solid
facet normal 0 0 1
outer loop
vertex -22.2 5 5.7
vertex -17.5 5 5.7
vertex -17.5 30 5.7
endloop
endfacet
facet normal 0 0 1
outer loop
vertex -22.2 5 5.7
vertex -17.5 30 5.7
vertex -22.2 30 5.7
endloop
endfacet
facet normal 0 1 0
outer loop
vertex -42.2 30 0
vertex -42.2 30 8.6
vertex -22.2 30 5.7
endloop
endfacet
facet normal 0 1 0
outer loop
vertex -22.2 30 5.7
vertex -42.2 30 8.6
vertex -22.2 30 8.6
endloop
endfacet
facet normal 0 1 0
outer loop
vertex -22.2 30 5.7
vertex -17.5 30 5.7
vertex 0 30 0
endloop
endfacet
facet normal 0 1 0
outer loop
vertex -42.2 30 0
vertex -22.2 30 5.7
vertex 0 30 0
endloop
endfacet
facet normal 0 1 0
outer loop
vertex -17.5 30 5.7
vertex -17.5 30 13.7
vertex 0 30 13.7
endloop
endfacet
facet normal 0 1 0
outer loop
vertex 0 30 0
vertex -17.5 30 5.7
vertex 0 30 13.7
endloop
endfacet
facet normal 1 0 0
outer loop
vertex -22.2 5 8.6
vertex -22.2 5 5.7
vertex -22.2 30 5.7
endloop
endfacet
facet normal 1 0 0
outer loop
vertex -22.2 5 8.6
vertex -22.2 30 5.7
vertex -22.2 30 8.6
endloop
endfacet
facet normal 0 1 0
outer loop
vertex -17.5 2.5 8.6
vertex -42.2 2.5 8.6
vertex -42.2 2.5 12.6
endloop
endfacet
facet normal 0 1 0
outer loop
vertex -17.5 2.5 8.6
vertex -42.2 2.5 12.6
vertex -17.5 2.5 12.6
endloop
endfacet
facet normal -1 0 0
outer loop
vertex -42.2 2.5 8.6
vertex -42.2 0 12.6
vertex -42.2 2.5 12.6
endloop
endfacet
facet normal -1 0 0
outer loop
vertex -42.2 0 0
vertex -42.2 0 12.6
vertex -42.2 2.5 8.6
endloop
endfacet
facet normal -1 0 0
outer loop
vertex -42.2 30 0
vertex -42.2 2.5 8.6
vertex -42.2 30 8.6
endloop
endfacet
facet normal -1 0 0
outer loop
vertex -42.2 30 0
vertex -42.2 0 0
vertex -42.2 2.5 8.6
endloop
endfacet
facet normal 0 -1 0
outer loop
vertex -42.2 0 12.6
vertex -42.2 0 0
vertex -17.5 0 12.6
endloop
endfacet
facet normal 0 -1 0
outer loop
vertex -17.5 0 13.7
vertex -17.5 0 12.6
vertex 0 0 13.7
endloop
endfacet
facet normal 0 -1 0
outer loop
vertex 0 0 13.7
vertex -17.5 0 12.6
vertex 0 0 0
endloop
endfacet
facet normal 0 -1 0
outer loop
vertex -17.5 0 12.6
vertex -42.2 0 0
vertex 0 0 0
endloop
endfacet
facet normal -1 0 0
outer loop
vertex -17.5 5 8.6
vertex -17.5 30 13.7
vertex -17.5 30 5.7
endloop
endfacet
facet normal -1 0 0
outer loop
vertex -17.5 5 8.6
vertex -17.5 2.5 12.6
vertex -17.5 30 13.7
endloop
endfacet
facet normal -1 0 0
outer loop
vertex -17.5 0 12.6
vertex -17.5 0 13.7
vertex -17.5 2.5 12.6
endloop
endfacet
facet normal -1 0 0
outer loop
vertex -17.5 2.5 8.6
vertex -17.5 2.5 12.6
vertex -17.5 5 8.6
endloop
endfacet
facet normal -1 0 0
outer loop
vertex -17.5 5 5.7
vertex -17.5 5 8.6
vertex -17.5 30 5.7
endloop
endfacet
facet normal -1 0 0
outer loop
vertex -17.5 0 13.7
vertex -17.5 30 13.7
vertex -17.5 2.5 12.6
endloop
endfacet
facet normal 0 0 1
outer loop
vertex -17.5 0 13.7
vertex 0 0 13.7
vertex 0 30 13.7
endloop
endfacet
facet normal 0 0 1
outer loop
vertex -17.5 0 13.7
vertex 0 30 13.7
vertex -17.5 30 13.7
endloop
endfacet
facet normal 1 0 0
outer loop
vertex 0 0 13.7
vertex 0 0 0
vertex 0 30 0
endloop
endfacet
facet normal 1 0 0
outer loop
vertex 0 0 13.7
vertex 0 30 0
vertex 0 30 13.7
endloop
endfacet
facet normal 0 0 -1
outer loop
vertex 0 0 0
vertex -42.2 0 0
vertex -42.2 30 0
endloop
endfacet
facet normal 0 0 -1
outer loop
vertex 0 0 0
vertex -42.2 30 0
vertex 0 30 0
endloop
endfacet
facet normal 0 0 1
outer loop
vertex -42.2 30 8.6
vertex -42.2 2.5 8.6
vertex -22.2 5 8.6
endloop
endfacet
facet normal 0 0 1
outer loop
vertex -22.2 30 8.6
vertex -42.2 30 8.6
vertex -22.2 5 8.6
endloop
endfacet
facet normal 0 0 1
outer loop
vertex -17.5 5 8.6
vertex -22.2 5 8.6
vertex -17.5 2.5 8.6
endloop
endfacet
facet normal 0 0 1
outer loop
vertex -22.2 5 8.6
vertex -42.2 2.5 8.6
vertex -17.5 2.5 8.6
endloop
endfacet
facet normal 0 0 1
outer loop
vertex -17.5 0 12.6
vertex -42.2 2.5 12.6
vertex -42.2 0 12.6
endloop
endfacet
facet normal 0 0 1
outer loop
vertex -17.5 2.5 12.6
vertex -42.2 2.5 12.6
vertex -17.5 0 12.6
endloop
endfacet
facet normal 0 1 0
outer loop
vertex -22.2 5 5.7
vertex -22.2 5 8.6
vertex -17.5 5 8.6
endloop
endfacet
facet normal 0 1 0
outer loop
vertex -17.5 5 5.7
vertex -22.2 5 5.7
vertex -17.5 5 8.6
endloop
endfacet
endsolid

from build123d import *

# Parameters (mm, degrees)
F1_DEPTH = 30
F0_W     = 4.7
F0_H     = 2.9
F2_DEPTH = 5
F3_W     = 24.7
F3_H     = 2.5
F4_DEPTH = 4


with BuildPart() as f1:
    # F0 (on Front) → F1 (new body)
    with BuildSketch(Plane.XZ):
        Polygon((-42.2, 0), (0, 0), (0, 13.7), (-17.5, 13.7), (-17.5, 8.6), (-17.5, 5.7), (-22.2, 5.7), (-22.2, 8.6), (-42.2, 8.6), align=None)
    extrude(amount=-F1_DEPTH)

    # F0 (on Front) → F2 (join)
    with BuildSketch(Plane.XZ):
        with Locations((-19.85, 7.15)):
            Rectangle(F0_W, F0_H)
    extrude(amount=-F2_DEPTH)

    # F3 (on face) → F4 (join)
    with BuildSketch(Plane.XY.offset(8.6)):
        with Locations((-29.85, 1.25)):
            Rectangle(F3_W, F3_H)
    extrude(amount=F4_DEPTH)


solid = f1.part
